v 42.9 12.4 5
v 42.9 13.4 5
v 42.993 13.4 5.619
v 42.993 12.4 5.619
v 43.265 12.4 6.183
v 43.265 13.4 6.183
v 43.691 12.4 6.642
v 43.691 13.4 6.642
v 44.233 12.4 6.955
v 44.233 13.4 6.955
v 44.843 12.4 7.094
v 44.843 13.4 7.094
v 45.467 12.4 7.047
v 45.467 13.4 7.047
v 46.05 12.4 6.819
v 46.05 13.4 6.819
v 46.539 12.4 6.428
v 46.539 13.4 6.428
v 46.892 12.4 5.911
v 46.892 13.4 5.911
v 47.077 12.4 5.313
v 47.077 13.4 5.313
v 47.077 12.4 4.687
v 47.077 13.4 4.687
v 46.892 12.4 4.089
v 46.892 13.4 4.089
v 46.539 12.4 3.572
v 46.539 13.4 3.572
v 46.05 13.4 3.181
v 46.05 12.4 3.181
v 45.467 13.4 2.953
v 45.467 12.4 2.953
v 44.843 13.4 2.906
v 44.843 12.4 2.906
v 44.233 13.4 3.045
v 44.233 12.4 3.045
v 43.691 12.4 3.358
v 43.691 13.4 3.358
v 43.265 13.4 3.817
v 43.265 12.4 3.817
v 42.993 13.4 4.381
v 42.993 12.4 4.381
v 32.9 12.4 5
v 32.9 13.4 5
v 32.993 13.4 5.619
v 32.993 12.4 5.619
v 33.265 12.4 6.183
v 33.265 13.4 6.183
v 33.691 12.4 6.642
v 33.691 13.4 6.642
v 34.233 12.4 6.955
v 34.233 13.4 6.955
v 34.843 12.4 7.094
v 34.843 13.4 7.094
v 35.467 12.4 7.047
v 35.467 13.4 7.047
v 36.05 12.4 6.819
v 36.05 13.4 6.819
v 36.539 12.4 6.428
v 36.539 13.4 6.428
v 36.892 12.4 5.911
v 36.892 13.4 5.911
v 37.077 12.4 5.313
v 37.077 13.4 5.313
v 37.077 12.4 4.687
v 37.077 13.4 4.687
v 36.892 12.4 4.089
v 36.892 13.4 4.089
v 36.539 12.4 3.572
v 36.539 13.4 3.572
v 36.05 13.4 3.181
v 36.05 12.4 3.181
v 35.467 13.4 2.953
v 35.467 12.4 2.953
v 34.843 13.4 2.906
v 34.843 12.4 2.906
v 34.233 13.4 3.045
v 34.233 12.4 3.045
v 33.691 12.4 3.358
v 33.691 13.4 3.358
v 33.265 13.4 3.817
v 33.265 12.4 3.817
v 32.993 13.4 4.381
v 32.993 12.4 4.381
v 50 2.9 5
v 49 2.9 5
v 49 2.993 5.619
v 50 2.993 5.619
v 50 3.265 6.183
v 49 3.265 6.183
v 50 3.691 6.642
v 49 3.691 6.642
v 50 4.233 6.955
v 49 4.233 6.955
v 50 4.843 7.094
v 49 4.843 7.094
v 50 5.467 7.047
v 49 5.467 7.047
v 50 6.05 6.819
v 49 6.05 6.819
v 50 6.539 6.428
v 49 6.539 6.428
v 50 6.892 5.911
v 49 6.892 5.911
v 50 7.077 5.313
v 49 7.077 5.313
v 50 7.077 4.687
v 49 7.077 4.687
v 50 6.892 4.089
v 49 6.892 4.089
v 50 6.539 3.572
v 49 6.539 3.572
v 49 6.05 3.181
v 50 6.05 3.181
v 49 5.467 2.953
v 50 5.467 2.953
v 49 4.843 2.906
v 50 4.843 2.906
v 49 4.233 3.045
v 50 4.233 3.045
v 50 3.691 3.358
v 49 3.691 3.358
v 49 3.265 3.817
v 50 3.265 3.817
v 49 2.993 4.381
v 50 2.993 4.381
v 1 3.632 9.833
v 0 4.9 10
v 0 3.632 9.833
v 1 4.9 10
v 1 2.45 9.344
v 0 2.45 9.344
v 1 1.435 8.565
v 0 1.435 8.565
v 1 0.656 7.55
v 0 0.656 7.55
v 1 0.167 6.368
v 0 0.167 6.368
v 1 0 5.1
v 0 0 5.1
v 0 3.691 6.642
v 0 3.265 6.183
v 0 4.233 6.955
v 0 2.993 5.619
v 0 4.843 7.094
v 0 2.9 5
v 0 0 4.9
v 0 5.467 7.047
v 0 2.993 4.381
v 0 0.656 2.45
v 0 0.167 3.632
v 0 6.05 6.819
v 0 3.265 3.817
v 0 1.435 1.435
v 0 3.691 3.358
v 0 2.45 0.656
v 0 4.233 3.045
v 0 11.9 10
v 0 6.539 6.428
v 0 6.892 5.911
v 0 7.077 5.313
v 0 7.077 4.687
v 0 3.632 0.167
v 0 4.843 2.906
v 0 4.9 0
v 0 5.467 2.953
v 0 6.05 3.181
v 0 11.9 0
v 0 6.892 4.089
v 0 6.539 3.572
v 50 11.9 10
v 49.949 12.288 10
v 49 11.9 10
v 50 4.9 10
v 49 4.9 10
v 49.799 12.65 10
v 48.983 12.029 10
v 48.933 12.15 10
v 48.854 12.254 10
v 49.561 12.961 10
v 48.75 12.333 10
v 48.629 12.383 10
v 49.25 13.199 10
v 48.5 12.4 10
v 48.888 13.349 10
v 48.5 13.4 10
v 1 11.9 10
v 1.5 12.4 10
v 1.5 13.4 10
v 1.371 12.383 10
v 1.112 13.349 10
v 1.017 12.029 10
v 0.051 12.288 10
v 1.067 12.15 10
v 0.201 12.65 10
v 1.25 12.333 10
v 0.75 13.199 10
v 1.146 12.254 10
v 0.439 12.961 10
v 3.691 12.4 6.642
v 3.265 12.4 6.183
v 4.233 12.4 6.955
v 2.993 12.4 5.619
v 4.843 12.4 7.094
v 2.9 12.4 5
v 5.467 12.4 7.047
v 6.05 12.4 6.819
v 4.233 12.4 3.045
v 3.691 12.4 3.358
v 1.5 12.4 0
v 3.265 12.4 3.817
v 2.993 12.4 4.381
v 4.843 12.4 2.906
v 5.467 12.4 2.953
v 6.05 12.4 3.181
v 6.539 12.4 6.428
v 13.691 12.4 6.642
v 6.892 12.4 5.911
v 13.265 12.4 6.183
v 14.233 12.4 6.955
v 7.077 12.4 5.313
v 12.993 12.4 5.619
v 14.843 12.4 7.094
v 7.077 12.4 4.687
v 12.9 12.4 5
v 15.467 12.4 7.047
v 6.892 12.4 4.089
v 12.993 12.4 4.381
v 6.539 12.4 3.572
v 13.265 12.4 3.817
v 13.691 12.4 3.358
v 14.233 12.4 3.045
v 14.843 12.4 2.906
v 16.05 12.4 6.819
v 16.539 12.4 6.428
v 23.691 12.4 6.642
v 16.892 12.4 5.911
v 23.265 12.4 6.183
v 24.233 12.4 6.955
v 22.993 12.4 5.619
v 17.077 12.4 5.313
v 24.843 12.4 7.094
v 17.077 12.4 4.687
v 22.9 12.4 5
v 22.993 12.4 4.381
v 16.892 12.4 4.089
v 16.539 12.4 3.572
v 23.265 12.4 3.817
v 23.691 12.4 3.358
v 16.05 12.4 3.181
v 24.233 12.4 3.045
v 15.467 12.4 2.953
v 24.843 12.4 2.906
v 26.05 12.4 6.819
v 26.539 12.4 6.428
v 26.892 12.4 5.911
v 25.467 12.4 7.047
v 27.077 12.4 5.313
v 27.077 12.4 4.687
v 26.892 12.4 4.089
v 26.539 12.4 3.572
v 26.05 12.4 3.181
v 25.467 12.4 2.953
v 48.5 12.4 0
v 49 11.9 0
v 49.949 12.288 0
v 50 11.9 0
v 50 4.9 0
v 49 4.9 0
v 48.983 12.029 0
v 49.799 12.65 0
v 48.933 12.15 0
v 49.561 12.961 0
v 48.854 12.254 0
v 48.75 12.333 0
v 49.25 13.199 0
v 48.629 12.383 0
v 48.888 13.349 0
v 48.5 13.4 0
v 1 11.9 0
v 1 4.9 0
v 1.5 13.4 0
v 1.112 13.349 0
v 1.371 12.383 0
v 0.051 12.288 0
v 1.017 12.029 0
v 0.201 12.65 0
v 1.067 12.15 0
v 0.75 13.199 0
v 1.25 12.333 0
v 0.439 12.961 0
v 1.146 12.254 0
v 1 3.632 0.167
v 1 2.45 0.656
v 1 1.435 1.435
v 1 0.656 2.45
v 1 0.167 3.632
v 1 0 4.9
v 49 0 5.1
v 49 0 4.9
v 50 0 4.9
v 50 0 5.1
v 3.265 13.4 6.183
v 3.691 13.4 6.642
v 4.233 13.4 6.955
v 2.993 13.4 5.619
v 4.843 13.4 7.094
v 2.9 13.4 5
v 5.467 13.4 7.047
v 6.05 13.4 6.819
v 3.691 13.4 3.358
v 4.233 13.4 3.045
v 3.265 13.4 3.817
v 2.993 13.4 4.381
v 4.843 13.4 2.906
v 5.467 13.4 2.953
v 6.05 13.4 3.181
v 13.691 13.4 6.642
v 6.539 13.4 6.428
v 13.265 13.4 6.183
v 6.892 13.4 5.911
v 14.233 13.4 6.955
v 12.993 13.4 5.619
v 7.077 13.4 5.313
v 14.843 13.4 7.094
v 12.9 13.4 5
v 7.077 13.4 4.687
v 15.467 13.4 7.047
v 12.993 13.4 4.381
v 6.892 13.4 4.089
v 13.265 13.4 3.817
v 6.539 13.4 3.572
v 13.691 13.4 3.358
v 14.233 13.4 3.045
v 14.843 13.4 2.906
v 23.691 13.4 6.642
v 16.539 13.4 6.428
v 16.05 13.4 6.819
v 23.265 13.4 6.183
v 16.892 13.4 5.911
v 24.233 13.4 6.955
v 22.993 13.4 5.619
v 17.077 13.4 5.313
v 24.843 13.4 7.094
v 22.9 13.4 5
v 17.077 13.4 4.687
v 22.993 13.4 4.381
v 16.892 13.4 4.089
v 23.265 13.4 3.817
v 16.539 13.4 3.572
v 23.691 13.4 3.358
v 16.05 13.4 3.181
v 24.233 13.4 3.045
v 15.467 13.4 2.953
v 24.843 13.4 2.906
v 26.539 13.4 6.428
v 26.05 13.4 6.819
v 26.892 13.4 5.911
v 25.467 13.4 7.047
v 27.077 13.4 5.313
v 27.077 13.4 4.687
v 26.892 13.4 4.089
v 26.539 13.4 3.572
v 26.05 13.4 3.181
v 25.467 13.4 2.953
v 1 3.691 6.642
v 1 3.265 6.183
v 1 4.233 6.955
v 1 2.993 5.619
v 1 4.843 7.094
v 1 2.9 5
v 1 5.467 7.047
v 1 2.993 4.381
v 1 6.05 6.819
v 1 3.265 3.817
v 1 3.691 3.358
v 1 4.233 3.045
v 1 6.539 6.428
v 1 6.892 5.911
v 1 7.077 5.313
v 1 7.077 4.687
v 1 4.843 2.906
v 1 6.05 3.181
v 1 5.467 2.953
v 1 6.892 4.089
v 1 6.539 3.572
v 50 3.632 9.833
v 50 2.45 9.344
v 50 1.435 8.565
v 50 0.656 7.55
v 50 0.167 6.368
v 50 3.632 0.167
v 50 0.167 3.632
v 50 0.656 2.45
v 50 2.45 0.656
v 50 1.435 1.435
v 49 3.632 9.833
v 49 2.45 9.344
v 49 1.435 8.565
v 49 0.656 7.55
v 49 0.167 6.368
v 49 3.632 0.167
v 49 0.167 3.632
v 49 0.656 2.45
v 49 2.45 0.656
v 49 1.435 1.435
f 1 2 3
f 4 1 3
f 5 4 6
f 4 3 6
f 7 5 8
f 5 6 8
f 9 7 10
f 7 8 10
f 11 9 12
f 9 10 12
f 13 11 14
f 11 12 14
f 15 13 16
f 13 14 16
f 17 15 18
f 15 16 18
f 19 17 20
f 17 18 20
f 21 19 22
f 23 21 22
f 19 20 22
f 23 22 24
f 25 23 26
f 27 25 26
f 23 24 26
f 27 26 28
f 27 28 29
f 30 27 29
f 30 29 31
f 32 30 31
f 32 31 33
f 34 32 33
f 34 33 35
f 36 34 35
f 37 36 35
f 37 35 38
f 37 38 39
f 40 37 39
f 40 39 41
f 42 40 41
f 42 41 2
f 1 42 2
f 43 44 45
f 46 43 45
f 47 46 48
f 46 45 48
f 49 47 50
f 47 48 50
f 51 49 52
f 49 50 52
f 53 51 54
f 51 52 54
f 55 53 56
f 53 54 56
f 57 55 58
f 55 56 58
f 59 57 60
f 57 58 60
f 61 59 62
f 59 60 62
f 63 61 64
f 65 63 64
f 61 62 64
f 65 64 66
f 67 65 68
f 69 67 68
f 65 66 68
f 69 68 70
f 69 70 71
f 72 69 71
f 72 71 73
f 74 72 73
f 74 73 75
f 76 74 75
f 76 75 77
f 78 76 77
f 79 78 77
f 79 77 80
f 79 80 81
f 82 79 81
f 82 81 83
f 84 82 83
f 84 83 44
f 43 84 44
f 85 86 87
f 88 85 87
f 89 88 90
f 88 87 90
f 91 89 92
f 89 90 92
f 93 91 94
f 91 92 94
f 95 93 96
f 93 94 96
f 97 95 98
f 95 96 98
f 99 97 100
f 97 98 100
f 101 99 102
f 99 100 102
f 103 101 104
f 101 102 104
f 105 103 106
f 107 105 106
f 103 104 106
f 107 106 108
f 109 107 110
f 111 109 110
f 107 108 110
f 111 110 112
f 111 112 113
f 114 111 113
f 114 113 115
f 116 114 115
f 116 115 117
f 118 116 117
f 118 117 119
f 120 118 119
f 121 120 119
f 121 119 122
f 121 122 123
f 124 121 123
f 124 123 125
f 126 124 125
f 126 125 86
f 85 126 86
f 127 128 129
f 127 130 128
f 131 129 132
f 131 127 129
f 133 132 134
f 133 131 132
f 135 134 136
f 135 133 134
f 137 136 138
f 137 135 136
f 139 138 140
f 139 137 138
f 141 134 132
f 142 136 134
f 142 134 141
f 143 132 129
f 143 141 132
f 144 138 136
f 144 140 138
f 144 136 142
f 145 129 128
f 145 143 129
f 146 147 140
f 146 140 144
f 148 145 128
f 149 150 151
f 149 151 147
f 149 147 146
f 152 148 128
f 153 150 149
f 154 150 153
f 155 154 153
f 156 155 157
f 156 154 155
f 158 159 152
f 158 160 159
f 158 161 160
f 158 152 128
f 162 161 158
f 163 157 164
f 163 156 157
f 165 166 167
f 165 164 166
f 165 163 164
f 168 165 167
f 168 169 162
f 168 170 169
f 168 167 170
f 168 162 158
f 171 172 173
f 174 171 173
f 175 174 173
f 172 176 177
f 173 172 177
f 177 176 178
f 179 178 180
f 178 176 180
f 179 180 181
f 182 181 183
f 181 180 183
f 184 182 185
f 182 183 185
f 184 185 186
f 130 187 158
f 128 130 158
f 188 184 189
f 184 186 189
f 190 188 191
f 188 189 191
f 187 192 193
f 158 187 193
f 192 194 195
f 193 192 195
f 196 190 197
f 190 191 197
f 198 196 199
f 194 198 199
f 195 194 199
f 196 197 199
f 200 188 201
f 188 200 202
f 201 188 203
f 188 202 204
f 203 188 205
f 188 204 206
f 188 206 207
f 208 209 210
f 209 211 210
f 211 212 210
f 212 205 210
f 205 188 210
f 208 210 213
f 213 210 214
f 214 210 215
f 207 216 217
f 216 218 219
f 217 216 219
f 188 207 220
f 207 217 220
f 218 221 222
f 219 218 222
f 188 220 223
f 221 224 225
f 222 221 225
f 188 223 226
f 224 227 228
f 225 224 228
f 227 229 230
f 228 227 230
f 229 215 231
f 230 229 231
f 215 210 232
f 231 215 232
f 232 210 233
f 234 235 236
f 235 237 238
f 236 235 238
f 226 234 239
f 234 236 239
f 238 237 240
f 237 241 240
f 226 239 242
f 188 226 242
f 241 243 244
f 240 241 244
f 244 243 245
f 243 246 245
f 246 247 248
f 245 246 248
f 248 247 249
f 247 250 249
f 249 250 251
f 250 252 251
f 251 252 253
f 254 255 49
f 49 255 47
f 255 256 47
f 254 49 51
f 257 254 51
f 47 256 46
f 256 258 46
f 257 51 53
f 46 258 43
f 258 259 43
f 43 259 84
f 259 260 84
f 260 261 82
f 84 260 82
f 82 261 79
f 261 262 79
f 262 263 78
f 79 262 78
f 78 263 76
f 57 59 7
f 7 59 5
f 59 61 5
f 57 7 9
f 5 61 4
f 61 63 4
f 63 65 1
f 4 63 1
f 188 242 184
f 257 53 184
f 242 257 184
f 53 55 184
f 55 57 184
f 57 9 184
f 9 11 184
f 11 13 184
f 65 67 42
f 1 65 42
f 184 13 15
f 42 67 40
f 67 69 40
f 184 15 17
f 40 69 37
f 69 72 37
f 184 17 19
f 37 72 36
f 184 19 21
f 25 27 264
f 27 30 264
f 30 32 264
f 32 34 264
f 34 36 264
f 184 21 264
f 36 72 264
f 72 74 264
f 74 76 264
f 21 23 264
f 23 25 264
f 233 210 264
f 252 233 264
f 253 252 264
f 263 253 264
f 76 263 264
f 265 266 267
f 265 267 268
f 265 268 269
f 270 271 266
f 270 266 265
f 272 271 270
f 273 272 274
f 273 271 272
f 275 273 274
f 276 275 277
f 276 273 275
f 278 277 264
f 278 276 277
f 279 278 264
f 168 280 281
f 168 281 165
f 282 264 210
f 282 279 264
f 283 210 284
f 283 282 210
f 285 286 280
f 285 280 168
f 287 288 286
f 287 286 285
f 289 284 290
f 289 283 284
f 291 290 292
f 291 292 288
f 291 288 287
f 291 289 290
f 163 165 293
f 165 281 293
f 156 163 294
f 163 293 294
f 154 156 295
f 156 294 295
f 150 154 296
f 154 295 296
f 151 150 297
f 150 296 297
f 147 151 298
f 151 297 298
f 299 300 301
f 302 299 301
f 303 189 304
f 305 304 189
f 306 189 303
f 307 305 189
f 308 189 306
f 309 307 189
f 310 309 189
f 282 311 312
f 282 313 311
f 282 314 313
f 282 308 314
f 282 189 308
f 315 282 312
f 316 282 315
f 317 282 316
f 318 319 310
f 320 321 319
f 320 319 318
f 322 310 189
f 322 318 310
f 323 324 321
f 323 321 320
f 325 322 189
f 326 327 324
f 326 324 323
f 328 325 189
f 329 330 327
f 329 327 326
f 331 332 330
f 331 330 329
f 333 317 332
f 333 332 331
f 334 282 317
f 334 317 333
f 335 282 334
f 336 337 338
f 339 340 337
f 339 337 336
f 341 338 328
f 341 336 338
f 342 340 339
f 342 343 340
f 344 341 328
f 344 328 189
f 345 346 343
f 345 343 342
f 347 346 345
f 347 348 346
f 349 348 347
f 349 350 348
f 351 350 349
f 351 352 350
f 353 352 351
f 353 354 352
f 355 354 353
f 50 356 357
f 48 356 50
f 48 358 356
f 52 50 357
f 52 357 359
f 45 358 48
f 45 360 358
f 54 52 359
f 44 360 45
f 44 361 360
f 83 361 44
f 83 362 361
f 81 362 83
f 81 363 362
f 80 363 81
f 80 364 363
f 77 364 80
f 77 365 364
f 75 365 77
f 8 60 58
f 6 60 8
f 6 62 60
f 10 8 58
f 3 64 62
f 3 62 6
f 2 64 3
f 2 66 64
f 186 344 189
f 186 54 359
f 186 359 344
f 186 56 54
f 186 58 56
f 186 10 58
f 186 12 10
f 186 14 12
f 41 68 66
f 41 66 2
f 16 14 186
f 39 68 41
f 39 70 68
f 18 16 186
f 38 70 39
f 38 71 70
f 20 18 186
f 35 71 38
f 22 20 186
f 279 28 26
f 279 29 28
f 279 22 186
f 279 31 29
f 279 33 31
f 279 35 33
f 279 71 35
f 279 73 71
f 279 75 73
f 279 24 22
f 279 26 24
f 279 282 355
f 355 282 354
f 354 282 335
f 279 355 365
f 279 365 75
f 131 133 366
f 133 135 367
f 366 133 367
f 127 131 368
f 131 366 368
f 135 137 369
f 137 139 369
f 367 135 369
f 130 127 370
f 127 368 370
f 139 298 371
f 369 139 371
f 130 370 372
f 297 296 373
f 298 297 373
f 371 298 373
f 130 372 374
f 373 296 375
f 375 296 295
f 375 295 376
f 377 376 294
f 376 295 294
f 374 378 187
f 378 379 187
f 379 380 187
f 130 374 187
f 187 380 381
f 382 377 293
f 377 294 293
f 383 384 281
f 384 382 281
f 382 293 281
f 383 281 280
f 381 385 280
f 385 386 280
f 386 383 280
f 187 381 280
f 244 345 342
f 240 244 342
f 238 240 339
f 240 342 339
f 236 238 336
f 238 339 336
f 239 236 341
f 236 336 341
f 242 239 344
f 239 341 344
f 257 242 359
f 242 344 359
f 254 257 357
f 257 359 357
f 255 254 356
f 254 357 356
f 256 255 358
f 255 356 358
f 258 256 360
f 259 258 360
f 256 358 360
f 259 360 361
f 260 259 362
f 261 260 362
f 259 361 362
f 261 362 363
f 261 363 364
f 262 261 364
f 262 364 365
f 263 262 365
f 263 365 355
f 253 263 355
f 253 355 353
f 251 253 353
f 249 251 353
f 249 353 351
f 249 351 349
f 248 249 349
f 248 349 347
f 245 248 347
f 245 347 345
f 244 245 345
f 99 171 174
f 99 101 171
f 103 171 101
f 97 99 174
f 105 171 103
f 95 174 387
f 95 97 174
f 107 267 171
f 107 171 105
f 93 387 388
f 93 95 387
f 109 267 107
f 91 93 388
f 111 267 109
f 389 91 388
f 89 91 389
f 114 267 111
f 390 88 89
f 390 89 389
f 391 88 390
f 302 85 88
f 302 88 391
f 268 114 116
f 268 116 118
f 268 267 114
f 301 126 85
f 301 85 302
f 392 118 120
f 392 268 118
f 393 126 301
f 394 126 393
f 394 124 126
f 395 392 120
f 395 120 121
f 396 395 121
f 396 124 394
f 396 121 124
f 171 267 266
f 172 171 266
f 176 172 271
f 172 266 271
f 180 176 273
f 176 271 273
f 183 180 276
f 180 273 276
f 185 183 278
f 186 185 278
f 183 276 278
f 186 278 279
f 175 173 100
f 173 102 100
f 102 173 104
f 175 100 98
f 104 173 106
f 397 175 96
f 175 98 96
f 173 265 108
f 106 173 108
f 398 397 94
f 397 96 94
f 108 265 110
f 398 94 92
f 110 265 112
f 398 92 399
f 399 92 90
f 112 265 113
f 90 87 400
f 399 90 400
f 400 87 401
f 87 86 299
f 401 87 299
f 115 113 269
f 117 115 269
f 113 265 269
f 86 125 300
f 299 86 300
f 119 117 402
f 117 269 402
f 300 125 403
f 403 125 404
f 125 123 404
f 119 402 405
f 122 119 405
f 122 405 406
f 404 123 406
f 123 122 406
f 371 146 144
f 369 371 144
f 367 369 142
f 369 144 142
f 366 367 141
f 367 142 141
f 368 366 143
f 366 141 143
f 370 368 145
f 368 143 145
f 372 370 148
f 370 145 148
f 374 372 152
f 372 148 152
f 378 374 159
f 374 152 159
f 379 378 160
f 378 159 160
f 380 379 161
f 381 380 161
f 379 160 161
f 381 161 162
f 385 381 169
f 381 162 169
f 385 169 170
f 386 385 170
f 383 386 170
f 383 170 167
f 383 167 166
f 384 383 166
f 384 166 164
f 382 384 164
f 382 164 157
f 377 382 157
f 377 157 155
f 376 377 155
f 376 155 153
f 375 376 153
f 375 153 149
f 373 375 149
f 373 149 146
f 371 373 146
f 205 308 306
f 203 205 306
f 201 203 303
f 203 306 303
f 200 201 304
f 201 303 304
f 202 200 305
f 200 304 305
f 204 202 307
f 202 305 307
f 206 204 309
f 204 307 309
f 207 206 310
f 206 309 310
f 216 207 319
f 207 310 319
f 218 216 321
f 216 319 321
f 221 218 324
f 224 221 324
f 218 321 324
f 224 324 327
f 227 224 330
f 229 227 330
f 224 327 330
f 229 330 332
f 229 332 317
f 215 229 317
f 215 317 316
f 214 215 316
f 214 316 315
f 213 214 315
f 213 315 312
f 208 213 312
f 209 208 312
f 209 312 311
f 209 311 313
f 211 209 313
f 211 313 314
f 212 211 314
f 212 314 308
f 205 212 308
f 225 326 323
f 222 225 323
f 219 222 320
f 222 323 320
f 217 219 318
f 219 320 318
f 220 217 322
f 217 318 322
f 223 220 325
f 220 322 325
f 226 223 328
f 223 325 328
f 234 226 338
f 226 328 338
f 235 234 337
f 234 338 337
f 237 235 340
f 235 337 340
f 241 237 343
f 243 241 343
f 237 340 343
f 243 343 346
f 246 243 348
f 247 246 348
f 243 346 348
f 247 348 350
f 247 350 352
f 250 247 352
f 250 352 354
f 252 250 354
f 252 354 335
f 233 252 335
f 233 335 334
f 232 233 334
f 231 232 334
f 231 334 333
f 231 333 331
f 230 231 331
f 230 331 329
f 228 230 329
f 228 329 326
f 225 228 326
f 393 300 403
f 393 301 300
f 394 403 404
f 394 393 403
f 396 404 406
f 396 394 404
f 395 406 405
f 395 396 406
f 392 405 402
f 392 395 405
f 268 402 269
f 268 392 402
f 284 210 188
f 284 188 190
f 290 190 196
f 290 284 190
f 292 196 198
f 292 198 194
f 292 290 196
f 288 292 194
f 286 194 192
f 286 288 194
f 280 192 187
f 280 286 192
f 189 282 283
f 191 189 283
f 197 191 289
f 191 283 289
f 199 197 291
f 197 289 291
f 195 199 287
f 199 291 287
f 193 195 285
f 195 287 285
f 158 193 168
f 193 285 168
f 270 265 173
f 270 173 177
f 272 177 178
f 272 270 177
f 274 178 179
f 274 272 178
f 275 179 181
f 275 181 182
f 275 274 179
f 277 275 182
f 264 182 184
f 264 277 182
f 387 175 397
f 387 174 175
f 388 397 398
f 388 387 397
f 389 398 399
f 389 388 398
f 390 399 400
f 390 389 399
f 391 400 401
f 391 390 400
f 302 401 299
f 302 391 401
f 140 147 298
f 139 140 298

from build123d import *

# Parameters (mm, degrees)
PAD_DEPTH       = 10
FILLET_R        = 4.9
FILLET001_R     = 4.9
FILLET002_R     = 4.9
FILLET003_R     = 4.9
SKETCH001_R     = 2.1
POCKET_DEPTH    = 50.001
SKETCH002_R     = 2.1
POCKET001_DEPTH = 13.401


with BuildPart() as part:
    # Sketch → Pad (new body)
    with BuildSketch(Plane.XY):
        with BuildLine():
            Line((0, 0), (0, 11.9))
            ThreePointArc((1.5, 13.4), (0.43934, 12.96066), (0, 11.9))
            Line((1.5, 13.4), (48.5, 13.4))
            ThreePointArc((50, 11.9), (49.56066, 12.96066), (48.5, 13.4))
            Line((50, 11.9), (50, 0))
            Line((49, 0), (50, 0))
            Line((49, 11.9), (49, 0))
            ThreePointArc((49, 11.9), (48.853553, 12.253553), (48.5, 12.4))
            Line((1.5, 12.4), (48.5, 12.4))
            ThreePointArc((1.5, 12.4), (1.146447, 12.253553), (1, 11.9))
            Line((1, 0), (1, 11.9))
            Line((0, 0), (1, 0))
        make_face()
    extrude(amount=PAD_DEPTH)

    # Fillet
    fillet_edges = [part.edges().sort_by_distance(p)[0] for p in [
        (49.5, 0, 0),
    ]]
    fillet(fillet_edges, radius=FILLET_R)

    # Fillet001
    fillet001_edges = [part.edges().sort_by_distance(p)[0] for p in [
        (0.5, 0, 0),
    ]]
    fillet(fillet001_edges, radius=FILLET001_R)

    # Fillet002
    fillet002_edges = [part.edges().sort_by_distance(p)[0] for p in [
        (49.5, 0, 10),
    ]]
    fillet(fillet002_edges, radius=FILLET002_R)

    # Fillet003
    fillet003_edges = [part.edges().sort_by_distance(p)[0] for p in [
        (0.5, 0, 10),
    ]]
    fillet(fillet003_edges, radius=FILLET003_R)

    # Sketch001 → Pocket (cut, through all)
    with BuildSketch(Plane(origin=(0, 0, 0), x_dir=(0, -1, 0), z_dir=(-1, 0, 0))):
        with Locations((-5, 5)):
            Circle(SKETCH001_R)
    extrude(amount=-POCKET_DEPTH, mode=Mode.SUBTRACT)

    # Sketch002 → Pocket001 (cut, through all)
    with BuildSketch(Plane(origin=(0, 13.4, 0), x_dir=(-1, 0, 0), z_dir=(0, 1, 0))):
        with Locations((-5, 5)):
            Circle(SKETCH002_R)
        with Locations((-15, 5)):
            Circle(SKETCH002_R)
        with Locations((-25, 5)):
            Circle(SKETCH002_R)
        with Locations((-35, 5)):
            Circle(SKETCH002_R)
        with Locations((-45, 5)):
            Circle(SKETCH002_R)
    extrude(amount=-POCKET001_DEPTH, mode=Mode.SUBTRACT)


solid = part.part
